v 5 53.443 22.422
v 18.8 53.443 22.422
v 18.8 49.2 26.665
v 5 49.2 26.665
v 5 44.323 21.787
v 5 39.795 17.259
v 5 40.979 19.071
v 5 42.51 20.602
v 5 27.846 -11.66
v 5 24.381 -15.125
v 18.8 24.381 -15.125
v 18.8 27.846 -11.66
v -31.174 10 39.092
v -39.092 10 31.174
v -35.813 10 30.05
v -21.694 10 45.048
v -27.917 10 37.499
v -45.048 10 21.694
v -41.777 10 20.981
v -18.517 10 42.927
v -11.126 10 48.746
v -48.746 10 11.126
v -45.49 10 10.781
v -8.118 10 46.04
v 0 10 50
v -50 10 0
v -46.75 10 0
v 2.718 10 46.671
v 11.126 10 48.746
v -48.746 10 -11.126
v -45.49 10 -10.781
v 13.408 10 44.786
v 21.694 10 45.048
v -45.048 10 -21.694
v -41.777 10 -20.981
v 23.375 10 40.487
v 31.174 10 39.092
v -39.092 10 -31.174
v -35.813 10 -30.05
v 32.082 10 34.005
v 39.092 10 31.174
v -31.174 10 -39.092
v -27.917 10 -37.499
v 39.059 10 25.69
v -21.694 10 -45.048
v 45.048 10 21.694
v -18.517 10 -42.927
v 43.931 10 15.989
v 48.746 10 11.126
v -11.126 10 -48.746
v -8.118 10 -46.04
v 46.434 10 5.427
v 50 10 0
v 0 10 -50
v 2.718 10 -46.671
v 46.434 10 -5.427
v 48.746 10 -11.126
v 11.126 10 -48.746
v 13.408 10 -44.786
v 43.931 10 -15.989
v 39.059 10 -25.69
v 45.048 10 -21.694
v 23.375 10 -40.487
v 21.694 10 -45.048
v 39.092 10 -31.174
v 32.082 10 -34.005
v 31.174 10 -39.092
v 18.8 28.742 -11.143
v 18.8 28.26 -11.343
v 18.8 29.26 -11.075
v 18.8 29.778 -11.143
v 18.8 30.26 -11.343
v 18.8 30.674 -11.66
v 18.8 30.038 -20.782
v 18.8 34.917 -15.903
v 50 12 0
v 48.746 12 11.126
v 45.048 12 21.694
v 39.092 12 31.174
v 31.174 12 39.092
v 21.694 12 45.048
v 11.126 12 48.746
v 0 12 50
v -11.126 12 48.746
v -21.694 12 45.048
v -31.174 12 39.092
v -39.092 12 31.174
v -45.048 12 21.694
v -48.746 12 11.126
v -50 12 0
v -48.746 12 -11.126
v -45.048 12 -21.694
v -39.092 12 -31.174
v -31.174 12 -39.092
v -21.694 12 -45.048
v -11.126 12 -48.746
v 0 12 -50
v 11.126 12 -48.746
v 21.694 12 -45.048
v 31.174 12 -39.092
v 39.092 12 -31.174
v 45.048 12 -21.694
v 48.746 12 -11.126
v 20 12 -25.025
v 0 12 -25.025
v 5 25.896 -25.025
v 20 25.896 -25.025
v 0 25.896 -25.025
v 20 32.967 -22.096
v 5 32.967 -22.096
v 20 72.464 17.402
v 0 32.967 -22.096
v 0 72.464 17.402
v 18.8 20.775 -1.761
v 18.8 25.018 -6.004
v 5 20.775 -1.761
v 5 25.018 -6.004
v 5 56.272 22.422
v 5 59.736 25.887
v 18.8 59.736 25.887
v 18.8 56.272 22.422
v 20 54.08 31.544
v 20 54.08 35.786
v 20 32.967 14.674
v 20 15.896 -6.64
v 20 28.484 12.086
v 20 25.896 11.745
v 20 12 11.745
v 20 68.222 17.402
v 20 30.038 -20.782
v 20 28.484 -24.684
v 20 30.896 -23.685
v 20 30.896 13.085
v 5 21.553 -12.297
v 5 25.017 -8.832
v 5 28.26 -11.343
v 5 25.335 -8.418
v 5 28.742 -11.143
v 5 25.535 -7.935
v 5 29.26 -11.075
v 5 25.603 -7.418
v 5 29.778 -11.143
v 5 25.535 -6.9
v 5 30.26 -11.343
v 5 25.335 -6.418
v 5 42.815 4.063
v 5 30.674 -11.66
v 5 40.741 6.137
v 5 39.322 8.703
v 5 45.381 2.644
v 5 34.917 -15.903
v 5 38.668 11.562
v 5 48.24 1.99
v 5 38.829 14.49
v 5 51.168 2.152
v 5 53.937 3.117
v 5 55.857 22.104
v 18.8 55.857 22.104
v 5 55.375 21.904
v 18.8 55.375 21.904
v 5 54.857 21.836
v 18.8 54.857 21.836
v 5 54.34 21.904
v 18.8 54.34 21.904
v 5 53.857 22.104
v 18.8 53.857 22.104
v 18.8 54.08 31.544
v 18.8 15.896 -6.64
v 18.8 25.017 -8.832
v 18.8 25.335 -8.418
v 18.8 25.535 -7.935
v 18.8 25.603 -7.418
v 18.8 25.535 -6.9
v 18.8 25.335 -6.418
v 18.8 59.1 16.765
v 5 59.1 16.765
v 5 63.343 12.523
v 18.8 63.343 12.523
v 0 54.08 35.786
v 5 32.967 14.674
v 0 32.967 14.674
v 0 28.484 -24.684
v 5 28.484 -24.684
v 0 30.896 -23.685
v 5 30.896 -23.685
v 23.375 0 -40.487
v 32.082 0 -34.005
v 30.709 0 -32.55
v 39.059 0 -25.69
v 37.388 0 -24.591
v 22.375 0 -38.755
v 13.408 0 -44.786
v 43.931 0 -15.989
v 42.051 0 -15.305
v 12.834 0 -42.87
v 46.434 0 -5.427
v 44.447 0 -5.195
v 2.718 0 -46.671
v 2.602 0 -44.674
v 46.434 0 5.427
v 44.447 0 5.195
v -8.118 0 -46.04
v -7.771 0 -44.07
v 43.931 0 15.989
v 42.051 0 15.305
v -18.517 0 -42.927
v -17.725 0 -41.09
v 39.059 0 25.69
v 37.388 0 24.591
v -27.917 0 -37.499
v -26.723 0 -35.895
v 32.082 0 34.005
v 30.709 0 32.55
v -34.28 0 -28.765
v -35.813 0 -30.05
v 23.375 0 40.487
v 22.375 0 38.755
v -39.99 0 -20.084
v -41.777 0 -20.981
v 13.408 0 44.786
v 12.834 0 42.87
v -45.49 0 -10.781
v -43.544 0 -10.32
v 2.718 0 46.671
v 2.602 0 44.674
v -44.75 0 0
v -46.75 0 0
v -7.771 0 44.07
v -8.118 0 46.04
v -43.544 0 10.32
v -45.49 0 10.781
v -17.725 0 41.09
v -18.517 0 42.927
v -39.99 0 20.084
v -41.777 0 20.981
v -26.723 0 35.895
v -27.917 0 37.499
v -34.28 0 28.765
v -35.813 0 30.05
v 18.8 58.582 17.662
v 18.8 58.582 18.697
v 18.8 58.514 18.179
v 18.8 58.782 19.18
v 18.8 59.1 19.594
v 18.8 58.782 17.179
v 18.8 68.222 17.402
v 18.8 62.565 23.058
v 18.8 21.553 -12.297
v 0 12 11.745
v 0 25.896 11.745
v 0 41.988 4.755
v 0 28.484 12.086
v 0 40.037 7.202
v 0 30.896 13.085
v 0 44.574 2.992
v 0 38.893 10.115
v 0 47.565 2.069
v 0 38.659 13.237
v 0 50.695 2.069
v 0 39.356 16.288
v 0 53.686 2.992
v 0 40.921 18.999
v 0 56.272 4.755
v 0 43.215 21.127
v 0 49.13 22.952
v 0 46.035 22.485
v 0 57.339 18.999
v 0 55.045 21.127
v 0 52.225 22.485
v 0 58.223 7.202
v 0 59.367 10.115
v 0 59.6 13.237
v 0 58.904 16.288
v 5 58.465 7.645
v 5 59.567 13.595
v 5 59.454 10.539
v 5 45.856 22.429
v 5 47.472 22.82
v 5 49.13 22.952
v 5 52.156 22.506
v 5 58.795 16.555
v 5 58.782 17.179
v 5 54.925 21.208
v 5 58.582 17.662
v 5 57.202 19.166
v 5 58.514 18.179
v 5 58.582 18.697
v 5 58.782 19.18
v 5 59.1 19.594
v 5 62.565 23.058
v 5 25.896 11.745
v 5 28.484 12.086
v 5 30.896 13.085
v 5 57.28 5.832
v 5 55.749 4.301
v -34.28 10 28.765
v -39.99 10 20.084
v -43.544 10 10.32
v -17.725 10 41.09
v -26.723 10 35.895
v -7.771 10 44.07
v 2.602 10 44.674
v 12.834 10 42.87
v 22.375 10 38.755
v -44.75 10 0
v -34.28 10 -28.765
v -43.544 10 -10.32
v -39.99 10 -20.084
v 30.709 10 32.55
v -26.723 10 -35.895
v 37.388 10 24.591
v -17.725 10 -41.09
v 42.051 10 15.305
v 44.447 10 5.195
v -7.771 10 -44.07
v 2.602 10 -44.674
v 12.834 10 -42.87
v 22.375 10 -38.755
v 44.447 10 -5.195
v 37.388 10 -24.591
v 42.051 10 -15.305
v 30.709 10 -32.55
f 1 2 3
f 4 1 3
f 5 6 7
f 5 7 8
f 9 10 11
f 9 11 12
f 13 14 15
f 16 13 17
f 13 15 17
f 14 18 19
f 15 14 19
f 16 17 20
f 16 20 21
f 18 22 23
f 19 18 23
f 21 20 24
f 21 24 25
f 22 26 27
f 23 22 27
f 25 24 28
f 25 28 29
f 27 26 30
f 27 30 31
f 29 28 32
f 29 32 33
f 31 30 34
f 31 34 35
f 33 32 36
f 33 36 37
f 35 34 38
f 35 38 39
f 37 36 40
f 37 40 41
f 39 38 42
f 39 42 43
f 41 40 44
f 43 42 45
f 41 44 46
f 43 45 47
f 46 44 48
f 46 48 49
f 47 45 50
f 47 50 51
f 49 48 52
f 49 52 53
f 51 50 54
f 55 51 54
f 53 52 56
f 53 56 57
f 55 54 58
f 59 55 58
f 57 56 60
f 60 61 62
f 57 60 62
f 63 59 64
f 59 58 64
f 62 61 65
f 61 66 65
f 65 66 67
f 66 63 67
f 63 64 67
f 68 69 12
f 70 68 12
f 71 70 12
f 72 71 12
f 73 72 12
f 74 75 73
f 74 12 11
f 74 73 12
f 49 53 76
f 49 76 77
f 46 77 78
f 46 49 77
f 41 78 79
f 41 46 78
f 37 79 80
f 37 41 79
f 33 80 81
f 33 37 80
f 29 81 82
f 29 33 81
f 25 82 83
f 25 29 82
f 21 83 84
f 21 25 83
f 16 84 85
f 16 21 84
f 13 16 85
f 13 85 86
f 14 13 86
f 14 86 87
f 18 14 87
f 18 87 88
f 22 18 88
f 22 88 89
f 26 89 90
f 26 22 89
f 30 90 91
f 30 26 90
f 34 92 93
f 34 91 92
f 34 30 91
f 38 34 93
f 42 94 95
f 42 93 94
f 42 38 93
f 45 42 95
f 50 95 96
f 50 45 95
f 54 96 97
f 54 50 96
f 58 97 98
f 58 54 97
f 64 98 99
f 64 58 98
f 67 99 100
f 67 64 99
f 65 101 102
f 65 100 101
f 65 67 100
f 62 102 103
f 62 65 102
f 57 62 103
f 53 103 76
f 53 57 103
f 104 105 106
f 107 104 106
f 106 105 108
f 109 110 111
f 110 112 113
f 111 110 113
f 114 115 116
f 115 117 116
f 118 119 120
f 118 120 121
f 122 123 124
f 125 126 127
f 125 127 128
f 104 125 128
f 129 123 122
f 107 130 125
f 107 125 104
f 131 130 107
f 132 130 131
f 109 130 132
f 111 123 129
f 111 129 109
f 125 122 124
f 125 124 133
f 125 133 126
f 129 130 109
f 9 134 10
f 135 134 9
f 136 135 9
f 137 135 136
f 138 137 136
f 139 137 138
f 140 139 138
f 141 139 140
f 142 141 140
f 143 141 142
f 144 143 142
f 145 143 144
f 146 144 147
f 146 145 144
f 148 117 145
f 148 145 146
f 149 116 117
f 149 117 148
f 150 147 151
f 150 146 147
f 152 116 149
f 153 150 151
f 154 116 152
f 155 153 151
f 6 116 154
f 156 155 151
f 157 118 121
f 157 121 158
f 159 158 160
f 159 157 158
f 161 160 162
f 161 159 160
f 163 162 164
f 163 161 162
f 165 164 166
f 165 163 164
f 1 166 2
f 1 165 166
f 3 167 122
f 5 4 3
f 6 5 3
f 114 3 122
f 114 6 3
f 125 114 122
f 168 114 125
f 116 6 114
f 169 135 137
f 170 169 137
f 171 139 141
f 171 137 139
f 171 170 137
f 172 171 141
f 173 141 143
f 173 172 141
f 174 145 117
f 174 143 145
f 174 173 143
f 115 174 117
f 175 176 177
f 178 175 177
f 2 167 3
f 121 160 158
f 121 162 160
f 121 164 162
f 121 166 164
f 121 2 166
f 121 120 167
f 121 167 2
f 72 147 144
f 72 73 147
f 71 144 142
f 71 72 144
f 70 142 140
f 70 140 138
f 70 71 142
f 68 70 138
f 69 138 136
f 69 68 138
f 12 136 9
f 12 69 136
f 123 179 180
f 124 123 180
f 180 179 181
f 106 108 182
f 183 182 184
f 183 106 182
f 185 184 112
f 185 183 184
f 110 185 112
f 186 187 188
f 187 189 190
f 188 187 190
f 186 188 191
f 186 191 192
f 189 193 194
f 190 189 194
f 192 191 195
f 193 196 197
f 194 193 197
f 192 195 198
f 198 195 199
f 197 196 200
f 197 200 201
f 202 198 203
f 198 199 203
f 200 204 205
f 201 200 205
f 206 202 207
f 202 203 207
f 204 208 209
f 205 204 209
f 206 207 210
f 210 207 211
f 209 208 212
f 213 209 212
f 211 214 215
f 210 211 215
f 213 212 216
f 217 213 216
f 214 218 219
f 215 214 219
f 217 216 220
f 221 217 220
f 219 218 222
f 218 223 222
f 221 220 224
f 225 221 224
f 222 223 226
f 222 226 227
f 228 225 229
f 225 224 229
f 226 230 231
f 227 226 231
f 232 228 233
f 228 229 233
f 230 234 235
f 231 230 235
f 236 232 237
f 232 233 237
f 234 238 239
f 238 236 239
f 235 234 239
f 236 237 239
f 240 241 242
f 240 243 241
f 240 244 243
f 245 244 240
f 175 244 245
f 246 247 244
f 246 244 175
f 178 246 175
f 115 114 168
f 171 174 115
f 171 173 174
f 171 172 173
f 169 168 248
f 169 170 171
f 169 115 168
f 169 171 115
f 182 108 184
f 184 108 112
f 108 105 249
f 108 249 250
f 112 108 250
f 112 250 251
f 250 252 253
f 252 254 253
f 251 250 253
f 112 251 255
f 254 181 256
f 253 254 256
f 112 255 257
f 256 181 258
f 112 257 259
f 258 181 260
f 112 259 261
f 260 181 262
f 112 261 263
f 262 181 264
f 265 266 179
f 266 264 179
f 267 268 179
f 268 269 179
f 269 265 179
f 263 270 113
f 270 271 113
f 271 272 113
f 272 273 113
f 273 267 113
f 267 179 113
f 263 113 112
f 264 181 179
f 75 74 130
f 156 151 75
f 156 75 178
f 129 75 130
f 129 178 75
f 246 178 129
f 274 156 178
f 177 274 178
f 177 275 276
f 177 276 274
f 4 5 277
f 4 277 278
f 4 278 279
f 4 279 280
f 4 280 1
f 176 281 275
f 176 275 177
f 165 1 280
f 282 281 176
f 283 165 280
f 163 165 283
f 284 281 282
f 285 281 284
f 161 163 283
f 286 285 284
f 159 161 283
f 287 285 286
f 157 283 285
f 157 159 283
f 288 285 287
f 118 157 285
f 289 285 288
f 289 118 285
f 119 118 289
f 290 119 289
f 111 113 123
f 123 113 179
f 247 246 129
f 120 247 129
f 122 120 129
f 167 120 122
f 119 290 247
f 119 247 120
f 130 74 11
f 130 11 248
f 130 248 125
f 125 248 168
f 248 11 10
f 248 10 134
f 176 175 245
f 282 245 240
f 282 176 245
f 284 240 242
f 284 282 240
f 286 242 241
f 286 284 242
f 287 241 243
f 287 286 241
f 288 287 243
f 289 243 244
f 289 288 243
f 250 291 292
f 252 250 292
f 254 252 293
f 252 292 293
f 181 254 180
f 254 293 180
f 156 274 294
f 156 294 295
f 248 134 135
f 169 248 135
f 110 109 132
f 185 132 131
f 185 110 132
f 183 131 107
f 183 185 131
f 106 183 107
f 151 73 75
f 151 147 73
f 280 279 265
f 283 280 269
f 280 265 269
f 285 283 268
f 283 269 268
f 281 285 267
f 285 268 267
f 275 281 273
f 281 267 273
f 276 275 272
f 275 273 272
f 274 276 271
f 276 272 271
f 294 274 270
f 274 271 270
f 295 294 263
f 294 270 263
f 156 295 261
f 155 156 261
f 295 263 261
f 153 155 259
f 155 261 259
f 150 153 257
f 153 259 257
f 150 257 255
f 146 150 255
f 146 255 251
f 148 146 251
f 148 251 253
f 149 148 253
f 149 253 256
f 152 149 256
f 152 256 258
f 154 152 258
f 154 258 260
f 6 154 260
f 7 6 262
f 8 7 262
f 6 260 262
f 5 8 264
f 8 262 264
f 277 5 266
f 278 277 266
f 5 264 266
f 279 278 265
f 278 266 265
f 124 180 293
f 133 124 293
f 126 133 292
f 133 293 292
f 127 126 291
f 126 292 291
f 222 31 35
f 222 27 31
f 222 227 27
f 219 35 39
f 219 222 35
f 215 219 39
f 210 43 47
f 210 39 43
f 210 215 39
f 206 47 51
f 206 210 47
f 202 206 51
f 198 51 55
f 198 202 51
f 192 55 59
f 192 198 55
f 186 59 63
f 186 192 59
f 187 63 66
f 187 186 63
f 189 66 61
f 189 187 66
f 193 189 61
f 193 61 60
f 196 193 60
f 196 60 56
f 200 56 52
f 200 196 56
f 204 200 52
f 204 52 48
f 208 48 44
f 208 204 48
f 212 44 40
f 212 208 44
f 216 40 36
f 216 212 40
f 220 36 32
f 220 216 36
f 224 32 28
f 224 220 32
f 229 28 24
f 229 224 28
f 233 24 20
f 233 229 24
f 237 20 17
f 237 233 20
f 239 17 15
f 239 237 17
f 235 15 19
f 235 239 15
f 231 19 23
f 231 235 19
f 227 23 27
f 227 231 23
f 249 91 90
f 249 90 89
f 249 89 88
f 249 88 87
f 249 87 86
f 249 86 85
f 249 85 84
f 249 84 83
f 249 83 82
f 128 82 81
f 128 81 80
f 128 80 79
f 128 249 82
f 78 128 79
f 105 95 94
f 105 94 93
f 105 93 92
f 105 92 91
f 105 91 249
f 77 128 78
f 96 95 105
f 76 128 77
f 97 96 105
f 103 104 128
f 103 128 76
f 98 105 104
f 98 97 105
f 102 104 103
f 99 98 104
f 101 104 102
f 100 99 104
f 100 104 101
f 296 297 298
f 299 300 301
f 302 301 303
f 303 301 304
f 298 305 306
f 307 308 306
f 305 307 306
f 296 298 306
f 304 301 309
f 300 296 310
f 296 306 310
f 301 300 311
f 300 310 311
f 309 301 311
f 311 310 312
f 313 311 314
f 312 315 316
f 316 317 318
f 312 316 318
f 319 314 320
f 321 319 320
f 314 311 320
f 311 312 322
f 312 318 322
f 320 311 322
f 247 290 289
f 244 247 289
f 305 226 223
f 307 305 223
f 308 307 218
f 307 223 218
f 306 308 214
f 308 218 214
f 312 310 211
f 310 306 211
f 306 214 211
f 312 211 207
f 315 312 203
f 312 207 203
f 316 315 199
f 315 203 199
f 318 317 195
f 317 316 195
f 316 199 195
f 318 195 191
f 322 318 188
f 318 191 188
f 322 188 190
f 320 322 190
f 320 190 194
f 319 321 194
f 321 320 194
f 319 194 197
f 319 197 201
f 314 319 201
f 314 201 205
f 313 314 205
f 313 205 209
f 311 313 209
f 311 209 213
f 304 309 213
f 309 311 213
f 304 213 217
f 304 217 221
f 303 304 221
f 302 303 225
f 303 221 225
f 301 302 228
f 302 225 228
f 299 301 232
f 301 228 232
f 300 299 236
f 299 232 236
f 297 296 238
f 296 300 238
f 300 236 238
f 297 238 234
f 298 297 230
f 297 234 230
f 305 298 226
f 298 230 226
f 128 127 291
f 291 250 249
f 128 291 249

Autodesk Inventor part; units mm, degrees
ref_plane "YZ Plane" through (0, 0, 0) normal (1, 0, 0) x (0, 1, 0)
ref_plane "XZ Plane" through (0, 0, 0) normal (0, 1, 0) x (-1, 0, 0)
ref_plane "XY Plane" through (0, 0, 0) normal (0, 0, 1) x (1, 0, 0)
sketch "草圖1" plane through (0, 0, 0) normal (0, 1, 0) x (-1, 0, 0)
  circle A0 centre (0, 0) radius 46.75
  circle A1 centre (0, 0) radius 44.75
  dimension "d0" = 93.5
  dimension "d1" = 2
extrude "擠出1" add sketch "草圖1" along normal blind 10
sketch "草圖2" plane through (0, 10, 0) normal (0, 1, 0) x (1, 0, 0)
  circle A0 centre (0, 0) radius 50
  dimension "d4" = 100
extrude "擠出2" add sketch "草圖2" along normal blind 2
sketch "草圖4" plane through (0, 0, 0) normal (1, 0, 0) x (0, 1, 0)
  line L0 (12, -50) -> (12, 50) projected
  line L1 (12, -25.0248) -> (30.0379, -25.0248)
  line L2 (30.0379, -25.0248) -> (30.0379, 11.7448)
  line L3 (30.0379, 11.7448) -> (12, 11.7448)
  line L4 (12, 11.7448) -> (12, -25.0248)
  line L5 (30.0379, -25.0248) -> (72.4644, 17.4017)
  line L6 (72.4644, 17.4017) -> (54.0796, 35.7864)
  line L7 (54.0796, 35.7864) -> (11.6532, -6.64)
  line L8 (11.6532, -6.64) -> (30.0379, -25.0248)
  point P0 (0, 0)
  dimension "d12" = 45
  dimension "d13" = 26
  dimension "d14" = 60
extrude "擠出4" add sketch "草圖4" along normal blind 5
fillet "圓角1" radius 10 1 edges at (2.5, 30.0379, 11.7448)
fillet "圓角2" radius 10 1 edges at (2.5, 30.0379, -25.0248)
sketch "草圖5" plane through (5, 0, 0) normal (1, 0, 0) x (0, 0, -1)
  line L0 (22.0958, 32.9669) -> (-17.4017, 72.4644) projected
  line L1 (-17.4017, 72.4644) -> (-35.7864, 54.0796) projected
  line L2 (-35.7864, 54.0796) -> (-14.6737, 32.9669) projected
  line L3 (20.7821, 30.0379) -> (-17.4017, 68.2217)
  line L4 (-17.4017, 68.2217) -> (-31.5438, 54.0796)
  line L5 (-31.5438, 54.0796) -> (-12.5524, 35.0882)
  line L6 (-31.5438, 54.0796) -> (-17.4017, 68.2217)
  line L7 (-17.4017, 68.2217) -> (20.7821, 30.0379)
  line L8 (20.7821, 30.0379) -> (6.64, 15.8958)
  line L9 (6.64, 15.8958) -> (-31.5438, 54.0796)
  arc A0 (25.0248, 25.8958) -> (22.0958, 32.9669) centre (15.0248, 25.8958) ccw projected
  line L10 (22.0958, 32.9669) -> (-17.4017, 72.4644) projected
  line L11 (-17.4017, 72.4644) -> (-35.7864, 54.0796) projected
  line L12 (-35.7864, 54.0796) -> (-14.6737, 32.9669) projected
  arc A1 (-11.7448, 25.8958) -> (-14.6737, 32.9669) centre (-21.7448, 25.8958) ccw projected
  line L13 (-11.7448, 25.8958) -> (-11.7448, 12) projected
  line L14 (25.0248, 12) -> (-11.7448, 12) projected
  line L15 (25.0248, 12) -> (25.0248, 25.8958) projected
  point P0 (0, 0)
  dimension "d19" = 20
  dimension "d20" = 54
  dimension "d21" = 54
extrude "擠出5" add sketch "草圖5" along normal blind 15
sketch "草圖6" plane through (0, 0, 0) normal (-1, 0, 0) x (0, 0, 1)
  circle A0 centre (12.4519, 49.1298) radius 10.5
  line L0 (12.4519, 49.1298) -> (26.594, 63.272)
  line L1 (17.4017, 72.4644) -> (35.7864, 54.0796) projected
  line L2 (-6.64, 15.8958) -> (-20.7821, 30.0379) projected
  point P0 (0, 0)
  dimension "d24" = 37
  dimension "d25" = 21
extrude "擠出6" cut sketch "草圖6" against normal blind 5
sketch "草圖7" plane through (5, 0, 0) normal (1, 0, 0) x (0, 0, -1)
  line L0 (-17.4017, 68.2217) -> (20.7821, 30.0379) projected
  line L1 (15.9031, 34.917) -> (20.7821, 30.0379)
  line L2 (20.7821, 30.0379) -> (15.1253, 24.3811)
  line L3 (15.1253, 24.3811) -> (10.2462, 29.2601)
  line L4 (10.2462, 29.2601) -> (15.9031, 34.917)
  point P0 (0, 0)
  dimension "d28" = 8
  dimension "d29" = 6.9
extrude "擠出7" add sketch "草圖7" along normal blind 13.8
sketch "草圖8" plane through (5, 0, 0) normal (1, 0, 0) x (0, 0, -1)
  line L0 (-17.2591, 39.7949) -> (6.64, 15.8958) projected
  line L1 (1.7609, 20.7749) -> (6.64, 15.8958)
  line L2 (6.64, 15.8958) -> (12.2968, 21.5527)
  line L3 (12.2968, 21.5527) -> (7.4178, 26.4317)
  line L4 (7.4178, 26.4317) -> (1.7609, 20.7749)
  point P0 (0, 0)
  dimension "d32" = 8
  dimension "d33" = 6.9
extrude "擠出8" add sketch "草圖8" along normal blind 13.8
sketch "草圖9" plane through (5, 0, 0) normal (1, 0, 0) x (0, 0, -1)
  line L0 (-17.4017, 68.2217) -> (20.7821, 30.0379) projected
  line L1 (-12.5226, 63.3427) -> (-17.4017, 68.2217)
  line L2 (-17.4017, 68.2217) -> (-23.0585, 62.5649)
  line L3 (-23.0585, 62.5649) -> (-18.1795, 57.6858)
  line L4 (-18.1795, 57.6858) -> (-12.5226, 63.3427)
  line L5 (6.64, 15.8958) -> (-31.5438, 54.0796) projected
  line L6 (-26.6648, 49.2005) -> (-31.5438, 54.0796)
  line L7 (-31.5438, 54.0796) -> (-25.8869, 59.7364)
  line L8 (-25.8869, 59.7364) -> (-21.0079, 54.8574)
  line L9 (-21.0079, 54.8574) -> (-26.6648, 49.2005)
  point P0 (0, 0)
  dimension "d36" = 8
  dimension "d37" = 8
  dimension "d38" = 6.9
extrude "擠出9" add sketch "草圖9" along normal blind 13.8
fillet "圓角3" radius 2 2 edges at (11.9, 54.8574, 21.0079) (11.9, 57.6858, 18.1795)
fillet "圓角4" radius 2 2 edges at (11.9, 26.4317, -7.4178) (11.9, 29.2601, -10.2462)
properties part number "第一關節"
